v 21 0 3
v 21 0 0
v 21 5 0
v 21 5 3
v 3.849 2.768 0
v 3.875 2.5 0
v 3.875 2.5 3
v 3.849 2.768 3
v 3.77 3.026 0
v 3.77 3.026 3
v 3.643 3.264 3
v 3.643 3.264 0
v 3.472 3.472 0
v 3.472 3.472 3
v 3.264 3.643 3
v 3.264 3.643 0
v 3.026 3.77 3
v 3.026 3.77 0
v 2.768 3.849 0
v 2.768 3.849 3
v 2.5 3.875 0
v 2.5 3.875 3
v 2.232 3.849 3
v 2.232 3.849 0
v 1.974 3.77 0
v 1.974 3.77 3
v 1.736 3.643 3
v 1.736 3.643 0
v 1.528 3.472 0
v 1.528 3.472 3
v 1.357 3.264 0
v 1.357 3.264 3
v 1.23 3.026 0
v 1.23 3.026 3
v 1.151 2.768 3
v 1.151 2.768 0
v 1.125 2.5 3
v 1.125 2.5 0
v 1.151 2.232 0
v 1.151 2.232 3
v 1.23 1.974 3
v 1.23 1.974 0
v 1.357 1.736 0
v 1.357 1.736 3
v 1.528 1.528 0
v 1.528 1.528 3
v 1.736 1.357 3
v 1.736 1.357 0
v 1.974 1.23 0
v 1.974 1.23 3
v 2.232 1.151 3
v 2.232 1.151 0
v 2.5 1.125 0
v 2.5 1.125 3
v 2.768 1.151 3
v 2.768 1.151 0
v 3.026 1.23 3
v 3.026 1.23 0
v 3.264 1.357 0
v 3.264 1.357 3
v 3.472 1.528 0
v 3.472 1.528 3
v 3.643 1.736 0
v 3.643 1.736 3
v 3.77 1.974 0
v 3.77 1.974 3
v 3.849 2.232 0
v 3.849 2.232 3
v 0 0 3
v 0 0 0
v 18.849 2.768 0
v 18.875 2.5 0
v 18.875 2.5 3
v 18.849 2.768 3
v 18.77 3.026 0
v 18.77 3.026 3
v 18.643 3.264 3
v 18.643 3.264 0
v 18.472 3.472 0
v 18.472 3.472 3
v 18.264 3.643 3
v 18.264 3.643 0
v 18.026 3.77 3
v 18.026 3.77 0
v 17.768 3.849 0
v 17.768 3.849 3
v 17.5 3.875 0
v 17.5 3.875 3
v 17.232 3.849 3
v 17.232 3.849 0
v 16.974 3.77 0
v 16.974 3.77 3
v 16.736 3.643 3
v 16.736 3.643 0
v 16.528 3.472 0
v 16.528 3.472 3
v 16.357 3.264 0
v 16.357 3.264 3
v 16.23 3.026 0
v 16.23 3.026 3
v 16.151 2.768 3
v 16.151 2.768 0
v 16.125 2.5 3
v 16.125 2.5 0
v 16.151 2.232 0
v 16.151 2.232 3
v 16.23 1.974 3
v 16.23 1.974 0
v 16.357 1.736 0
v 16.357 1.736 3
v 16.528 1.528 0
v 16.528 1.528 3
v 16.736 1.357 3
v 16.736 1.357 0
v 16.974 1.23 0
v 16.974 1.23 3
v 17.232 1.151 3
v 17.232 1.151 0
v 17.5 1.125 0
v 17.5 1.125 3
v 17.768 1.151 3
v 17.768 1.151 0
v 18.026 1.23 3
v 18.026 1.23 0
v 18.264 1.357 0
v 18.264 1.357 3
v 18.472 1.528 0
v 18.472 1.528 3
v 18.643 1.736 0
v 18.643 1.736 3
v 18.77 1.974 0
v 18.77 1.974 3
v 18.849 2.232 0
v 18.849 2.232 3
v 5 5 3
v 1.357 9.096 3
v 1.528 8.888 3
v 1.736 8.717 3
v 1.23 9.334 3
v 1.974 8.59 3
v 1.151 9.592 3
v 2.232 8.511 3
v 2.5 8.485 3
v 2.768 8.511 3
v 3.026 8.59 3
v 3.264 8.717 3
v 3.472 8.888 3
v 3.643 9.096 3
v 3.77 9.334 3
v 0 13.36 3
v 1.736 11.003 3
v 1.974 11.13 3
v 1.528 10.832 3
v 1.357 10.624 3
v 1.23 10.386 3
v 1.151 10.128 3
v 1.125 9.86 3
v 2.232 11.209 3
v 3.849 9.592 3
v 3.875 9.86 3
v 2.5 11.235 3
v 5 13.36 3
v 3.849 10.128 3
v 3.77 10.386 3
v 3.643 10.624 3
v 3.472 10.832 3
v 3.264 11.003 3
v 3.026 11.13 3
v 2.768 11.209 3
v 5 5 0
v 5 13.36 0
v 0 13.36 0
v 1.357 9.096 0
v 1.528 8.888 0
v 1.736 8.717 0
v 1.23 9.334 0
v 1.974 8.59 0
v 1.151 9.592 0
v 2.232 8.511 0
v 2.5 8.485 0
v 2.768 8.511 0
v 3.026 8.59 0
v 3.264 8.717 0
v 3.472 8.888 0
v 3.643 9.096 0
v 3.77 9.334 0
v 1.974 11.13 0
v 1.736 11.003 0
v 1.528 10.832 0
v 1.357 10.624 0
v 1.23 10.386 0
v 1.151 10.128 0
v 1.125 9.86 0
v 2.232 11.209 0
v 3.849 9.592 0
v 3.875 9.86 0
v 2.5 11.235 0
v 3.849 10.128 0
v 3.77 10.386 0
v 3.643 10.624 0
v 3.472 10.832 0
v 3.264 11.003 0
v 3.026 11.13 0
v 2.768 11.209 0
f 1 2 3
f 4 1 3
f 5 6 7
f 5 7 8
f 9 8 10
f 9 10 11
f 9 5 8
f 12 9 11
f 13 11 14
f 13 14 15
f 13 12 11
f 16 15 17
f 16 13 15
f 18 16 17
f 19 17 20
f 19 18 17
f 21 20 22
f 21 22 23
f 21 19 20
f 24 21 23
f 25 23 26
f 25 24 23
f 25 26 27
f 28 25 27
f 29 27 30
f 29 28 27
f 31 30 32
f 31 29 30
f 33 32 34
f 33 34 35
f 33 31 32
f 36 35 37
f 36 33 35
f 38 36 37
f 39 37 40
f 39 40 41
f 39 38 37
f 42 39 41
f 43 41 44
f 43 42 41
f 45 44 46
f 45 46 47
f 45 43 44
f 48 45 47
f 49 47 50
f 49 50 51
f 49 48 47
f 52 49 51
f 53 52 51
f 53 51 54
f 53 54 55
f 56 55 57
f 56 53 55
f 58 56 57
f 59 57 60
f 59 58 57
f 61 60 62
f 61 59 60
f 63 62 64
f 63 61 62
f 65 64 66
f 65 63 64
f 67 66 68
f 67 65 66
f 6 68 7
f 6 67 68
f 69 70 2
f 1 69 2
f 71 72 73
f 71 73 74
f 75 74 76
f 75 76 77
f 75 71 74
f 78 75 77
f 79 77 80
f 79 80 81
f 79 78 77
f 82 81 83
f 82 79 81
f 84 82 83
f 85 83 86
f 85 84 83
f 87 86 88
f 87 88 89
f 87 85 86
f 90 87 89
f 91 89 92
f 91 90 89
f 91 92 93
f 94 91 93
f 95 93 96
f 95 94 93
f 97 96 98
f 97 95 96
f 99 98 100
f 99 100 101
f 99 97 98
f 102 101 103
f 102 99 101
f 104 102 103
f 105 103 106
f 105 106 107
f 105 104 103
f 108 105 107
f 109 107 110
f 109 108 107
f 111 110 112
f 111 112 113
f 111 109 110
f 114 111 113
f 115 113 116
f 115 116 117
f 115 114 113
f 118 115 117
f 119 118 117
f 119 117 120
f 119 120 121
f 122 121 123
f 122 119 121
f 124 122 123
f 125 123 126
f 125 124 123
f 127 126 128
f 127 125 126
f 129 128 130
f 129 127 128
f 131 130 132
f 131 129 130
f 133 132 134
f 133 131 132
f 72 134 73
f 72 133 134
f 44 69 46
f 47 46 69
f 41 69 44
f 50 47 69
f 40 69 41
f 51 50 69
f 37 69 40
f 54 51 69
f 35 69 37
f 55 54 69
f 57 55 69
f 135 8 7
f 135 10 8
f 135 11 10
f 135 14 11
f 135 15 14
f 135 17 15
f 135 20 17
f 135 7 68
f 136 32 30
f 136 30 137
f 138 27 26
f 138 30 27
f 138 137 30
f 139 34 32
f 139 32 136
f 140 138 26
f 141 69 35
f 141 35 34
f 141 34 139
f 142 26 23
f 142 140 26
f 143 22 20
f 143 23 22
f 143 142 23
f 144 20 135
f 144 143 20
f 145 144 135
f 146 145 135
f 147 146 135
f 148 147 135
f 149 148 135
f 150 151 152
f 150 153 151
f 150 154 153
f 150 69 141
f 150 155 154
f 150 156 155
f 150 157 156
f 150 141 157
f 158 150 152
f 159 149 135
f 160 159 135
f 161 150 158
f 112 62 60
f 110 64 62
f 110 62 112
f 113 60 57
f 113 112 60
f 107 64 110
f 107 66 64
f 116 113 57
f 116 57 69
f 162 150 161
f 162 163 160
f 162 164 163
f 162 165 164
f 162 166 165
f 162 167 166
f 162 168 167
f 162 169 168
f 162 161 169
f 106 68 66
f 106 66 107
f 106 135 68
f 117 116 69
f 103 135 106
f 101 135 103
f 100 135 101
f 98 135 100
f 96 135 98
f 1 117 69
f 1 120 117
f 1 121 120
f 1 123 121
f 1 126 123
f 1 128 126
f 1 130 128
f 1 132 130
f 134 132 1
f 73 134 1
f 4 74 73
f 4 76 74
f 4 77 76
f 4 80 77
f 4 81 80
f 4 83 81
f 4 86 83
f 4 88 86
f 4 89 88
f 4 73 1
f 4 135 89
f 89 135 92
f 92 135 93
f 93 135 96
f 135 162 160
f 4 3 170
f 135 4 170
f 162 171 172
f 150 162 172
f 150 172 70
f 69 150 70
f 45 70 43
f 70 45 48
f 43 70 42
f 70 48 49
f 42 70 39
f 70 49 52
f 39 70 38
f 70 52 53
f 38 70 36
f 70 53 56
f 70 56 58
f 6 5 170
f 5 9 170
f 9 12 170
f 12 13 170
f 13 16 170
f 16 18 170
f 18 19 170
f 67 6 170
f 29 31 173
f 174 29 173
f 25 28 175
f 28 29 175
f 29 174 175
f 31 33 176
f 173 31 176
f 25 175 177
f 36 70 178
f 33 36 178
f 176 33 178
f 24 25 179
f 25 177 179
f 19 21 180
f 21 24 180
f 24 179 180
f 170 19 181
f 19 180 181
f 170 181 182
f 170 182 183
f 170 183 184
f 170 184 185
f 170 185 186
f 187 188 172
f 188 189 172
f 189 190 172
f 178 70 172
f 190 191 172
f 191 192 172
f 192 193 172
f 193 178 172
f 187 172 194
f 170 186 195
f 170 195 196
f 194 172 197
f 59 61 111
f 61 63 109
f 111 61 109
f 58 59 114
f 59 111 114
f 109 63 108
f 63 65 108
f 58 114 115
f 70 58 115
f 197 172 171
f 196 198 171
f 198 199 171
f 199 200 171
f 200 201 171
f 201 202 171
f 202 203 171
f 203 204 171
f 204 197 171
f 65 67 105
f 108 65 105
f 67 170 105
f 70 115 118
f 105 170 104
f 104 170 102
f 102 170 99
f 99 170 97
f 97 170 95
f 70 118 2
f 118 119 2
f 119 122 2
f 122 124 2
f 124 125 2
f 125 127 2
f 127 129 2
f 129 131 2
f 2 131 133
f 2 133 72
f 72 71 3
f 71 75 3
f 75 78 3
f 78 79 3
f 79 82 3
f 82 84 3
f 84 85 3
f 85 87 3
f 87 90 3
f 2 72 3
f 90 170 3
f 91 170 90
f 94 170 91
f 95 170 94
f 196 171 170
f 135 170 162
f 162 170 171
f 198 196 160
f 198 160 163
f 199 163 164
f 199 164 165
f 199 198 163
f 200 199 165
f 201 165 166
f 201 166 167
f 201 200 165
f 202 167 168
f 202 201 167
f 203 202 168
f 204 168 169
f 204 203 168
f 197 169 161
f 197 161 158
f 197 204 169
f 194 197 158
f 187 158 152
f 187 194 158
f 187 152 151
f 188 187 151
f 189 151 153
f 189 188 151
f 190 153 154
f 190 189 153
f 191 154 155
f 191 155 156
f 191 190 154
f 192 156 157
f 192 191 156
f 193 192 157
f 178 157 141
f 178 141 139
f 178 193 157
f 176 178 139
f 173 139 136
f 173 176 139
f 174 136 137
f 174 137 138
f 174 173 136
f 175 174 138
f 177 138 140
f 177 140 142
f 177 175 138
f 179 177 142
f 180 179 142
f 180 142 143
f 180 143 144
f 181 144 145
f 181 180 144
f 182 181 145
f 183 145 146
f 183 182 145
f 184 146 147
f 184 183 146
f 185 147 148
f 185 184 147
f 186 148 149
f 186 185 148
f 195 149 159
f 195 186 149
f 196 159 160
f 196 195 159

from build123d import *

# Parameters (mm, degrees)
SKETCH1_R           = 1.375
BOSS_EXTRUDE1_DEPTH = 3


with BuildPart() as part:
    # Sketch1 → Boss-Extrude1 (new body)
    with BuildSketch(Plane.XY):
        Polygon((0, 0), (21, 0), (21, 5), (5, 5), (5, 13.36), (0, 13.36), align=None)
        with Locations((17.5, 2.5)):
            Circle(SKETCH1_R, mode=Mode.SUBTRACT)
        with Locations((2.5, 2.5)):
            Circle(SKETCH1_R, mode=Mode.SUBTRACT)
        with Locations((2.5, 9.86)):
            Circle(SKETCH1_R, mode=Mode.SUBTRACT)
    extrude(amount=BOSS_EXTRUDE1_DEPTH)


solid = part.part
